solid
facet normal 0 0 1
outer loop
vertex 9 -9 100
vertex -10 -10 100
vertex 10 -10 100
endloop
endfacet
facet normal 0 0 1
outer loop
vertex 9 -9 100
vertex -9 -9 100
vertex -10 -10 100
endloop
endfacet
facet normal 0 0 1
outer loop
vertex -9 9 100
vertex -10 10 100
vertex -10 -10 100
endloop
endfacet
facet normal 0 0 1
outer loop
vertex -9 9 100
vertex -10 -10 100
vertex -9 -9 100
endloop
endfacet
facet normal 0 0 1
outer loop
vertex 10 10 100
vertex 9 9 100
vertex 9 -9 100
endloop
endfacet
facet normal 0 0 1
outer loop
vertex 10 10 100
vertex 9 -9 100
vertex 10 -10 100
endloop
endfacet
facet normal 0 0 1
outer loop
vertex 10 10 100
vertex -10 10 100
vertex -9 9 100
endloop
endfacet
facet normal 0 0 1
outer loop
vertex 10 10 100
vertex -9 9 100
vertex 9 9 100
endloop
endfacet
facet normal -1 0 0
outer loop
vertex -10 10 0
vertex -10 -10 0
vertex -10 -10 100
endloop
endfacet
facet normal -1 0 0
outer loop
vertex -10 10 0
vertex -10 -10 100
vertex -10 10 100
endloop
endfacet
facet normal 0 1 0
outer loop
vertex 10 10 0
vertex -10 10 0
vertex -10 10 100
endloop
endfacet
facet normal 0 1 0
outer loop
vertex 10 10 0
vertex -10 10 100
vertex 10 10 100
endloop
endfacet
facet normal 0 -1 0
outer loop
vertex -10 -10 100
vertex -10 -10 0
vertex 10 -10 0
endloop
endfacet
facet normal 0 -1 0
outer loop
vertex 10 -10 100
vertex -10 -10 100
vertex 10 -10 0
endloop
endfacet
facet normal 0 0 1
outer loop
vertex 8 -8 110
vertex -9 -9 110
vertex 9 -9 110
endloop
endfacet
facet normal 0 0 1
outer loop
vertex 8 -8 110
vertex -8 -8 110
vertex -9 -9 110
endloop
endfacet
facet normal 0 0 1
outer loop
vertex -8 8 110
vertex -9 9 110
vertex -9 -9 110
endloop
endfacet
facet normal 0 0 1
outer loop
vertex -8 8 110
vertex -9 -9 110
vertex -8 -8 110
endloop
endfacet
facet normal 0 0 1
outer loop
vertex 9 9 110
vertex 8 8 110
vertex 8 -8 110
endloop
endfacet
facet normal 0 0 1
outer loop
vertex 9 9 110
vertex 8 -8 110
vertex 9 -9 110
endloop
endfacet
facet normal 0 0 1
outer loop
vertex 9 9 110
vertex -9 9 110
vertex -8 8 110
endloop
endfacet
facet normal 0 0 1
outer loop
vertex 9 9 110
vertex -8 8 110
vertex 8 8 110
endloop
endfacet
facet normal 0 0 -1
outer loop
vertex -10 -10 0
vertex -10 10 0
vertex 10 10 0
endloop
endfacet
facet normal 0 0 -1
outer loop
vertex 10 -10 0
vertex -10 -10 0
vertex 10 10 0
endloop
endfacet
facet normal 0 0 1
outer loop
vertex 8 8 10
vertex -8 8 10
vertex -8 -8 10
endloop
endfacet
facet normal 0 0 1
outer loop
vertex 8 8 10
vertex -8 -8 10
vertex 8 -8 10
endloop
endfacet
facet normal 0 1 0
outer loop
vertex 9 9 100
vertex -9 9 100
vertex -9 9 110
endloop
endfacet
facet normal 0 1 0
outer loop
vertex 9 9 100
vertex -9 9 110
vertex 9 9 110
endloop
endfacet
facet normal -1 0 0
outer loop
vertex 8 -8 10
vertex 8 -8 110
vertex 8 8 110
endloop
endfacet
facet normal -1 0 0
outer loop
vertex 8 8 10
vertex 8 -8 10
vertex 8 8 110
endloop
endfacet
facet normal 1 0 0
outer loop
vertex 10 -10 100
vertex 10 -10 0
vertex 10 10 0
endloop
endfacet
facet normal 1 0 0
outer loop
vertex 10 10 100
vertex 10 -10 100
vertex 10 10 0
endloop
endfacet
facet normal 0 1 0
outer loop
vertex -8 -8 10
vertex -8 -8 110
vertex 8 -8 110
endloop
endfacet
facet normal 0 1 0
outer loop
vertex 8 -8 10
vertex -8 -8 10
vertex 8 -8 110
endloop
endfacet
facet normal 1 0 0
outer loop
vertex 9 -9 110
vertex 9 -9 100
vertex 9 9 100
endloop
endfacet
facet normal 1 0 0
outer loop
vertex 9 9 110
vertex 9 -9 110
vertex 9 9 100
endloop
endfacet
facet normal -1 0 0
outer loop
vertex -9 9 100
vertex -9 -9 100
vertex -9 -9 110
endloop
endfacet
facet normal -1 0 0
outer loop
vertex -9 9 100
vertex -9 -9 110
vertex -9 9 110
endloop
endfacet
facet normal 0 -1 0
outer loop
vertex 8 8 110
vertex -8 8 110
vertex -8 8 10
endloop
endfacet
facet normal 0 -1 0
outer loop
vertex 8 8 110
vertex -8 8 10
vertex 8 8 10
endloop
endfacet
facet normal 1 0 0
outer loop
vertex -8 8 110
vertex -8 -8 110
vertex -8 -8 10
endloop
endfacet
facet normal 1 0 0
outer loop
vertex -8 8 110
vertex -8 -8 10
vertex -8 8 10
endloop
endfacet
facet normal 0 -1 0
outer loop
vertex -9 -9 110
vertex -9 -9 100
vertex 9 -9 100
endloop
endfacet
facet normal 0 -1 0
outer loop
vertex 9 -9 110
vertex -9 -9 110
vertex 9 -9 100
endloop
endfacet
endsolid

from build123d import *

# Parameters (mm, degrees)
SKETCH_1_W          = 20
SKETCH_1_H          = 20
EXTRUDE_1_DEPTH     = 100
SKETCH_3_W          = 18
SKETCH_3_H          = 18
EXTRUDE_2_DEPTH     = 10
SKETCH_4_W          = 16
SKETCH_4_H          = 16
CUT_EXTRUDE_1_DEPTH = 100


with BuildPart() as part:
    # 草圖1 → 填料-伸長1 (new body)
    with BuildSketch(Plane.XY):
        Rectangle(SKETCH_1_W, SKETCH_1_H)
    extrude(amount=EXTRUDE_1_DEPTH)

    # 草圖3 → 填料-伸長2 (add)
    with BuildSketch(Plane.XY.offset(100)):
        Rectangle(SKETCH_3_W, SKETCH_3_H)
    extrude(amount=EXTRUDE_2_DEPTH)

    # 草圖4 → 除料-伸長1 (cut)
    with BuildSketch(Plane.XY.offset(110)):
        Rectangle(SKETCH_4_W, SKETCH_4_H)
    extrude(amount=-CUT_EXTRUDE_1_DEPTH, mode=Mode.SUBTRACT)


solid = part.part
